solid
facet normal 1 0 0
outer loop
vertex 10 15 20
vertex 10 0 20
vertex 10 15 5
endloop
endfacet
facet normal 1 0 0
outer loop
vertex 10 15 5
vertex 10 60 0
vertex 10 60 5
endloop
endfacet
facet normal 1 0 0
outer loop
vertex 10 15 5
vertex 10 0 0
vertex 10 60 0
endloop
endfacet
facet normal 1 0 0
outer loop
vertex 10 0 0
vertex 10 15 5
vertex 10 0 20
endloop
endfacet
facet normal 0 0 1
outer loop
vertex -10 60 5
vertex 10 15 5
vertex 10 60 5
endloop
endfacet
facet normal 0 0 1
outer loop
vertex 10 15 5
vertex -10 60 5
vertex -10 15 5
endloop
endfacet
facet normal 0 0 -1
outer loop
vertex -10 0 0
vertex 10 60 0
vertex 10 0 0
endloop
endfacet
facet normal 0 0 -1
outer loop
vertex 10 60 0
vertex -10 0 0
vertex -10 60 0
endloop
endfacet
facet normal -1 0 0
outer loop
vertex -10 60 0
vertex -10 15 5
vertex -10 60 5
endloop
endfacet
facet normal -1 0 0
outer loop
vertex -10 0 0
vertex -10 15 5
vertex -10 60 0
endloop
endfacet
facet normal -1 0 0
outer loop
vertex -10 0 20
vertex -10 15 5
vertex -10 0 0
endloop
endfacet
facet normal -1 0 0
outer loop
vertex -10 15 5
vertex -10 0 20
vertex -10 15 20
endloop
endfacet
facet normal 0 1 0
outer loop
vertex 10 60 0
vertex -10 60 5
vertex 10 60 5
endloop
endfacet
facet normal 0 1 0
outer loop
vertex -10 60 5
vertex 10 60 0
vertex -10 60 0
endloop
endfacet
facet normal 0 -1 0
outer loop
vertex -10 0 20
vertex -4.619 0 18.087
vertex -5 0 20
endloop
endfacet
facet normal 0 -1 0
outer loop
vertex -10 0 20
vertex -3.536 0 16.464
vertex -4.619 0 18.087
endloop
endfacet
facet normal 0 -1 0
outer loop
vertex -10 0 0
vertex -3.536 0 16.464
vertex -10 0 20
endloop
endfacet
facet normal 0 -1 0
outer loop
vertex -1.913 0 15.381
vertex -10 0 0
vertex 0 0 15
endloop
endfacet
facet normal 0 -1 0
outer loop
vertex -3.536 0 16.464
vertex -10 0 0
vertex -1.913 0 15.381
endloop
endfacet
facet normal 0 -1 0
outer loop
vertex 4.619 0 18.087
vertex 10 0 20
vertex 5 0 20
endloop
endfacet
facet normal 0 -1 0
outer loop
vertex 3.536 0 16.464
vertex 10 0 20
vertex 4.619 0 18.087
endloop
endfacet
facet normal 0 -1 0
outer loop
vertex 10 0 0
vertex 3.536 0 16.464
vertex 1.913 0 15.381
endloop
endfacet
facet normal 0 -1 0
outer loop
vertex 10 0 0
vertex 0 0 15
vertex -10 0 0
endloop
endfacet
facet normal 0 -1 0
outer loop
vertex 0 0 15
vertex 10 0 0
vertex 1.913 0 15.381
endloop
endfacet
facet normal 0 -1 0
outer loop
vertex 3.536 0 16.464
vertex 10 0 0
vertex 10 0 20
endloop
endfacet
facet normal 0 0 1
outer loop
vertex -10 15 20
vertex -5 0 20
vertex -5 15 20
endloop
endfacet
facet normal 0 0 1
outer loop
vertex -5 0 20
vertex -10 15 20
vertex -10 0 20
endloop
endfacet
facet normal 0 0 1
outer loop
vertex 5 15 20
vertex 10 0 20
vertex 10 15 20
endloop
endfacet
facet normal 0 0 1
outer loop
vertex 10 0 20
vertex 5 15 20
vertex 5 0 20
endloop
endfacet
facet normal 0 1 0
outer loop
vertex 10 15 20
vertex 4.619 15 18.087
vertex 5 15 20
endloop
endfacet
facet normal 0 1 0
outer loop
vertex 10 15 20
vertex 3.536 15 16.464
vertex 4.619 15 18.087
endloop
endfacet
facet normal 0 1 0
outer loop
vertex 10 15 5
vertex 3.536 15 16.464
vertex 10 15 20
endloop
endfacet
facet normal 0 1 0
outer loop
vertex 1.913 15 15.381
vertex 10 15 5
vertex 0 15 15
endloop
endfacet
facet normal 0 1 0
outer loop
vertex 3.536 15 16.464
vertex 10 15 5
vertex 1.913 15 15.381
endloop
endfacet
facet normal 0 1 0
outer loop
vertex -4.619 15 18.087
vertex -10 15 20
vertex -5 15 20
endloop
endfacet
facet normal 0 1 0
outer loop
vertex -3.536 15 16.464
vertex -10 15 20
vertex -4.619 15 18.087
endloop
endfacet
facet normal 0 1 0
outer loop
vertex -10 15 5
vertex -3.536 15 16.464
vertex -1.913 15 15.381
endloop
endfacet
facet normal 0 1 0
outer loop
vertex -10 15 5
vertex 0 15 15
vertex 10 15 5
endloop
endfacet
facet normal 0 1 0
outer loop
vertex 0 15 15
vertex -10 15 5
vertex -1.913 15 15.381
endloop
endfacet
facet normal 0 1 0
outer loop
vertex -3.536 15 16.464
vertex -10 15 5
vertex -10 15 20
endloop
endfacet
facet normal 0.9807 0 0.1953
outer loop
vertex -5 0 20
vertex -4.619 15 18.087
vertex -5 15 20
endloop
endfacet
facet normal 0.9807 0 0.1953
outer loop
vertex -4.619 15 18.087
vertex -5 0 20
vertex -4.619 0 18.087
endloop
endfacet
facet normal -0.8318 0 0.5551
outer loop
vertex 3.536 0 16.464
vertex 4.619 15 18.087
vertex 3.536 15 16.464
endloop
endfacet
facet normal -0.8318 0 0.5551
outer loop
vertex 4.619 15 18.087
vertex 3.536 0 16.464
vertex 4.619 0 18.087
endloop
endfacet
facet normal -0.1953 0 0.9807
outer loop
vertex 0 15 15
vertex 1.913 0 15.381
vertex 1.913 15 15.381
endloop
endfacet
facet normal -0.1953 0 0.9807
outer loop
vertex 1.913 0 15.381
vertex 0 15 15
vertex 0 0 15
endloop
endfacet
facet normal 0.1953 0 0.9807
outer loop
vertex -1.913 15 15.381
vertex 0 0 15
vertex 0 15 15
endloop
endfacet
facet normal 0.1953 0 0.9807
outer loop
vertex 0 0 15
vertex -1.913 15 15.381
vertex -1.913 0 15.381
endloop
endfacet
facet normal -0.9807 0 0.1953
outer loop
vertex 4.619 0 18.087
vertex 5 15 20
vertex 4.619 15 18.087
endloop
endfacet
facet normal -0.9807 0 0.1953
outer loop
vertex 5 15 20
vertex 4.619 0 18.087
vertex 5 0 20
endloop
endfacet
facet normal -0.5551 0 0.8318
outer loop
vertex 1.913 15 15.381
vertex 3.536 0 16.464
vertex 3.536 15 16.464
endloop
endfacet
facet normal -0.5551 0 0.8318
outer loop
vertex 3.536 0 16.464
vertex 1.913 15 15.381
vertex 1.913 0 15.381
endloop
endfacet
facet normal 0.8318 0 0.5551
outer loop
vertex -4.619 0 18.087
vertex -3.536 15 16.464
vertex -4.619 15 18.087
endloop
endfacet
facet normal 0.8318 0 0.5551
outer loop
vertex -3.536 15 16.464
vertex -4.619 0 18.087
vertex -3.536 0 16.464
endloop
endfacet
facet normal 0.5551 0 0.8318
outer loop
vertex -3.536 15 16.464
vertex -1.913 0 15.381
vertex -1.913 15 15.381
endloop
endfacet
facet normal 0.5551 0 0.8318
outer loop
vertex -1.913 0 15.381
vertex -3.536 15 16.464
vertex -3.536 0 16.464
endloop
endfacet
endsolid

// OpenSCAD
difference() {
  union() {
    translate([-10, 0, 0]) {
      cube([20, 60, 5]);
      cube([20, 15, 20]);
    }
  }
  translate([0, 16, 20]) {
    rotate([90, 0, 0]) cylinder(h=20, r=5);
  }
}
